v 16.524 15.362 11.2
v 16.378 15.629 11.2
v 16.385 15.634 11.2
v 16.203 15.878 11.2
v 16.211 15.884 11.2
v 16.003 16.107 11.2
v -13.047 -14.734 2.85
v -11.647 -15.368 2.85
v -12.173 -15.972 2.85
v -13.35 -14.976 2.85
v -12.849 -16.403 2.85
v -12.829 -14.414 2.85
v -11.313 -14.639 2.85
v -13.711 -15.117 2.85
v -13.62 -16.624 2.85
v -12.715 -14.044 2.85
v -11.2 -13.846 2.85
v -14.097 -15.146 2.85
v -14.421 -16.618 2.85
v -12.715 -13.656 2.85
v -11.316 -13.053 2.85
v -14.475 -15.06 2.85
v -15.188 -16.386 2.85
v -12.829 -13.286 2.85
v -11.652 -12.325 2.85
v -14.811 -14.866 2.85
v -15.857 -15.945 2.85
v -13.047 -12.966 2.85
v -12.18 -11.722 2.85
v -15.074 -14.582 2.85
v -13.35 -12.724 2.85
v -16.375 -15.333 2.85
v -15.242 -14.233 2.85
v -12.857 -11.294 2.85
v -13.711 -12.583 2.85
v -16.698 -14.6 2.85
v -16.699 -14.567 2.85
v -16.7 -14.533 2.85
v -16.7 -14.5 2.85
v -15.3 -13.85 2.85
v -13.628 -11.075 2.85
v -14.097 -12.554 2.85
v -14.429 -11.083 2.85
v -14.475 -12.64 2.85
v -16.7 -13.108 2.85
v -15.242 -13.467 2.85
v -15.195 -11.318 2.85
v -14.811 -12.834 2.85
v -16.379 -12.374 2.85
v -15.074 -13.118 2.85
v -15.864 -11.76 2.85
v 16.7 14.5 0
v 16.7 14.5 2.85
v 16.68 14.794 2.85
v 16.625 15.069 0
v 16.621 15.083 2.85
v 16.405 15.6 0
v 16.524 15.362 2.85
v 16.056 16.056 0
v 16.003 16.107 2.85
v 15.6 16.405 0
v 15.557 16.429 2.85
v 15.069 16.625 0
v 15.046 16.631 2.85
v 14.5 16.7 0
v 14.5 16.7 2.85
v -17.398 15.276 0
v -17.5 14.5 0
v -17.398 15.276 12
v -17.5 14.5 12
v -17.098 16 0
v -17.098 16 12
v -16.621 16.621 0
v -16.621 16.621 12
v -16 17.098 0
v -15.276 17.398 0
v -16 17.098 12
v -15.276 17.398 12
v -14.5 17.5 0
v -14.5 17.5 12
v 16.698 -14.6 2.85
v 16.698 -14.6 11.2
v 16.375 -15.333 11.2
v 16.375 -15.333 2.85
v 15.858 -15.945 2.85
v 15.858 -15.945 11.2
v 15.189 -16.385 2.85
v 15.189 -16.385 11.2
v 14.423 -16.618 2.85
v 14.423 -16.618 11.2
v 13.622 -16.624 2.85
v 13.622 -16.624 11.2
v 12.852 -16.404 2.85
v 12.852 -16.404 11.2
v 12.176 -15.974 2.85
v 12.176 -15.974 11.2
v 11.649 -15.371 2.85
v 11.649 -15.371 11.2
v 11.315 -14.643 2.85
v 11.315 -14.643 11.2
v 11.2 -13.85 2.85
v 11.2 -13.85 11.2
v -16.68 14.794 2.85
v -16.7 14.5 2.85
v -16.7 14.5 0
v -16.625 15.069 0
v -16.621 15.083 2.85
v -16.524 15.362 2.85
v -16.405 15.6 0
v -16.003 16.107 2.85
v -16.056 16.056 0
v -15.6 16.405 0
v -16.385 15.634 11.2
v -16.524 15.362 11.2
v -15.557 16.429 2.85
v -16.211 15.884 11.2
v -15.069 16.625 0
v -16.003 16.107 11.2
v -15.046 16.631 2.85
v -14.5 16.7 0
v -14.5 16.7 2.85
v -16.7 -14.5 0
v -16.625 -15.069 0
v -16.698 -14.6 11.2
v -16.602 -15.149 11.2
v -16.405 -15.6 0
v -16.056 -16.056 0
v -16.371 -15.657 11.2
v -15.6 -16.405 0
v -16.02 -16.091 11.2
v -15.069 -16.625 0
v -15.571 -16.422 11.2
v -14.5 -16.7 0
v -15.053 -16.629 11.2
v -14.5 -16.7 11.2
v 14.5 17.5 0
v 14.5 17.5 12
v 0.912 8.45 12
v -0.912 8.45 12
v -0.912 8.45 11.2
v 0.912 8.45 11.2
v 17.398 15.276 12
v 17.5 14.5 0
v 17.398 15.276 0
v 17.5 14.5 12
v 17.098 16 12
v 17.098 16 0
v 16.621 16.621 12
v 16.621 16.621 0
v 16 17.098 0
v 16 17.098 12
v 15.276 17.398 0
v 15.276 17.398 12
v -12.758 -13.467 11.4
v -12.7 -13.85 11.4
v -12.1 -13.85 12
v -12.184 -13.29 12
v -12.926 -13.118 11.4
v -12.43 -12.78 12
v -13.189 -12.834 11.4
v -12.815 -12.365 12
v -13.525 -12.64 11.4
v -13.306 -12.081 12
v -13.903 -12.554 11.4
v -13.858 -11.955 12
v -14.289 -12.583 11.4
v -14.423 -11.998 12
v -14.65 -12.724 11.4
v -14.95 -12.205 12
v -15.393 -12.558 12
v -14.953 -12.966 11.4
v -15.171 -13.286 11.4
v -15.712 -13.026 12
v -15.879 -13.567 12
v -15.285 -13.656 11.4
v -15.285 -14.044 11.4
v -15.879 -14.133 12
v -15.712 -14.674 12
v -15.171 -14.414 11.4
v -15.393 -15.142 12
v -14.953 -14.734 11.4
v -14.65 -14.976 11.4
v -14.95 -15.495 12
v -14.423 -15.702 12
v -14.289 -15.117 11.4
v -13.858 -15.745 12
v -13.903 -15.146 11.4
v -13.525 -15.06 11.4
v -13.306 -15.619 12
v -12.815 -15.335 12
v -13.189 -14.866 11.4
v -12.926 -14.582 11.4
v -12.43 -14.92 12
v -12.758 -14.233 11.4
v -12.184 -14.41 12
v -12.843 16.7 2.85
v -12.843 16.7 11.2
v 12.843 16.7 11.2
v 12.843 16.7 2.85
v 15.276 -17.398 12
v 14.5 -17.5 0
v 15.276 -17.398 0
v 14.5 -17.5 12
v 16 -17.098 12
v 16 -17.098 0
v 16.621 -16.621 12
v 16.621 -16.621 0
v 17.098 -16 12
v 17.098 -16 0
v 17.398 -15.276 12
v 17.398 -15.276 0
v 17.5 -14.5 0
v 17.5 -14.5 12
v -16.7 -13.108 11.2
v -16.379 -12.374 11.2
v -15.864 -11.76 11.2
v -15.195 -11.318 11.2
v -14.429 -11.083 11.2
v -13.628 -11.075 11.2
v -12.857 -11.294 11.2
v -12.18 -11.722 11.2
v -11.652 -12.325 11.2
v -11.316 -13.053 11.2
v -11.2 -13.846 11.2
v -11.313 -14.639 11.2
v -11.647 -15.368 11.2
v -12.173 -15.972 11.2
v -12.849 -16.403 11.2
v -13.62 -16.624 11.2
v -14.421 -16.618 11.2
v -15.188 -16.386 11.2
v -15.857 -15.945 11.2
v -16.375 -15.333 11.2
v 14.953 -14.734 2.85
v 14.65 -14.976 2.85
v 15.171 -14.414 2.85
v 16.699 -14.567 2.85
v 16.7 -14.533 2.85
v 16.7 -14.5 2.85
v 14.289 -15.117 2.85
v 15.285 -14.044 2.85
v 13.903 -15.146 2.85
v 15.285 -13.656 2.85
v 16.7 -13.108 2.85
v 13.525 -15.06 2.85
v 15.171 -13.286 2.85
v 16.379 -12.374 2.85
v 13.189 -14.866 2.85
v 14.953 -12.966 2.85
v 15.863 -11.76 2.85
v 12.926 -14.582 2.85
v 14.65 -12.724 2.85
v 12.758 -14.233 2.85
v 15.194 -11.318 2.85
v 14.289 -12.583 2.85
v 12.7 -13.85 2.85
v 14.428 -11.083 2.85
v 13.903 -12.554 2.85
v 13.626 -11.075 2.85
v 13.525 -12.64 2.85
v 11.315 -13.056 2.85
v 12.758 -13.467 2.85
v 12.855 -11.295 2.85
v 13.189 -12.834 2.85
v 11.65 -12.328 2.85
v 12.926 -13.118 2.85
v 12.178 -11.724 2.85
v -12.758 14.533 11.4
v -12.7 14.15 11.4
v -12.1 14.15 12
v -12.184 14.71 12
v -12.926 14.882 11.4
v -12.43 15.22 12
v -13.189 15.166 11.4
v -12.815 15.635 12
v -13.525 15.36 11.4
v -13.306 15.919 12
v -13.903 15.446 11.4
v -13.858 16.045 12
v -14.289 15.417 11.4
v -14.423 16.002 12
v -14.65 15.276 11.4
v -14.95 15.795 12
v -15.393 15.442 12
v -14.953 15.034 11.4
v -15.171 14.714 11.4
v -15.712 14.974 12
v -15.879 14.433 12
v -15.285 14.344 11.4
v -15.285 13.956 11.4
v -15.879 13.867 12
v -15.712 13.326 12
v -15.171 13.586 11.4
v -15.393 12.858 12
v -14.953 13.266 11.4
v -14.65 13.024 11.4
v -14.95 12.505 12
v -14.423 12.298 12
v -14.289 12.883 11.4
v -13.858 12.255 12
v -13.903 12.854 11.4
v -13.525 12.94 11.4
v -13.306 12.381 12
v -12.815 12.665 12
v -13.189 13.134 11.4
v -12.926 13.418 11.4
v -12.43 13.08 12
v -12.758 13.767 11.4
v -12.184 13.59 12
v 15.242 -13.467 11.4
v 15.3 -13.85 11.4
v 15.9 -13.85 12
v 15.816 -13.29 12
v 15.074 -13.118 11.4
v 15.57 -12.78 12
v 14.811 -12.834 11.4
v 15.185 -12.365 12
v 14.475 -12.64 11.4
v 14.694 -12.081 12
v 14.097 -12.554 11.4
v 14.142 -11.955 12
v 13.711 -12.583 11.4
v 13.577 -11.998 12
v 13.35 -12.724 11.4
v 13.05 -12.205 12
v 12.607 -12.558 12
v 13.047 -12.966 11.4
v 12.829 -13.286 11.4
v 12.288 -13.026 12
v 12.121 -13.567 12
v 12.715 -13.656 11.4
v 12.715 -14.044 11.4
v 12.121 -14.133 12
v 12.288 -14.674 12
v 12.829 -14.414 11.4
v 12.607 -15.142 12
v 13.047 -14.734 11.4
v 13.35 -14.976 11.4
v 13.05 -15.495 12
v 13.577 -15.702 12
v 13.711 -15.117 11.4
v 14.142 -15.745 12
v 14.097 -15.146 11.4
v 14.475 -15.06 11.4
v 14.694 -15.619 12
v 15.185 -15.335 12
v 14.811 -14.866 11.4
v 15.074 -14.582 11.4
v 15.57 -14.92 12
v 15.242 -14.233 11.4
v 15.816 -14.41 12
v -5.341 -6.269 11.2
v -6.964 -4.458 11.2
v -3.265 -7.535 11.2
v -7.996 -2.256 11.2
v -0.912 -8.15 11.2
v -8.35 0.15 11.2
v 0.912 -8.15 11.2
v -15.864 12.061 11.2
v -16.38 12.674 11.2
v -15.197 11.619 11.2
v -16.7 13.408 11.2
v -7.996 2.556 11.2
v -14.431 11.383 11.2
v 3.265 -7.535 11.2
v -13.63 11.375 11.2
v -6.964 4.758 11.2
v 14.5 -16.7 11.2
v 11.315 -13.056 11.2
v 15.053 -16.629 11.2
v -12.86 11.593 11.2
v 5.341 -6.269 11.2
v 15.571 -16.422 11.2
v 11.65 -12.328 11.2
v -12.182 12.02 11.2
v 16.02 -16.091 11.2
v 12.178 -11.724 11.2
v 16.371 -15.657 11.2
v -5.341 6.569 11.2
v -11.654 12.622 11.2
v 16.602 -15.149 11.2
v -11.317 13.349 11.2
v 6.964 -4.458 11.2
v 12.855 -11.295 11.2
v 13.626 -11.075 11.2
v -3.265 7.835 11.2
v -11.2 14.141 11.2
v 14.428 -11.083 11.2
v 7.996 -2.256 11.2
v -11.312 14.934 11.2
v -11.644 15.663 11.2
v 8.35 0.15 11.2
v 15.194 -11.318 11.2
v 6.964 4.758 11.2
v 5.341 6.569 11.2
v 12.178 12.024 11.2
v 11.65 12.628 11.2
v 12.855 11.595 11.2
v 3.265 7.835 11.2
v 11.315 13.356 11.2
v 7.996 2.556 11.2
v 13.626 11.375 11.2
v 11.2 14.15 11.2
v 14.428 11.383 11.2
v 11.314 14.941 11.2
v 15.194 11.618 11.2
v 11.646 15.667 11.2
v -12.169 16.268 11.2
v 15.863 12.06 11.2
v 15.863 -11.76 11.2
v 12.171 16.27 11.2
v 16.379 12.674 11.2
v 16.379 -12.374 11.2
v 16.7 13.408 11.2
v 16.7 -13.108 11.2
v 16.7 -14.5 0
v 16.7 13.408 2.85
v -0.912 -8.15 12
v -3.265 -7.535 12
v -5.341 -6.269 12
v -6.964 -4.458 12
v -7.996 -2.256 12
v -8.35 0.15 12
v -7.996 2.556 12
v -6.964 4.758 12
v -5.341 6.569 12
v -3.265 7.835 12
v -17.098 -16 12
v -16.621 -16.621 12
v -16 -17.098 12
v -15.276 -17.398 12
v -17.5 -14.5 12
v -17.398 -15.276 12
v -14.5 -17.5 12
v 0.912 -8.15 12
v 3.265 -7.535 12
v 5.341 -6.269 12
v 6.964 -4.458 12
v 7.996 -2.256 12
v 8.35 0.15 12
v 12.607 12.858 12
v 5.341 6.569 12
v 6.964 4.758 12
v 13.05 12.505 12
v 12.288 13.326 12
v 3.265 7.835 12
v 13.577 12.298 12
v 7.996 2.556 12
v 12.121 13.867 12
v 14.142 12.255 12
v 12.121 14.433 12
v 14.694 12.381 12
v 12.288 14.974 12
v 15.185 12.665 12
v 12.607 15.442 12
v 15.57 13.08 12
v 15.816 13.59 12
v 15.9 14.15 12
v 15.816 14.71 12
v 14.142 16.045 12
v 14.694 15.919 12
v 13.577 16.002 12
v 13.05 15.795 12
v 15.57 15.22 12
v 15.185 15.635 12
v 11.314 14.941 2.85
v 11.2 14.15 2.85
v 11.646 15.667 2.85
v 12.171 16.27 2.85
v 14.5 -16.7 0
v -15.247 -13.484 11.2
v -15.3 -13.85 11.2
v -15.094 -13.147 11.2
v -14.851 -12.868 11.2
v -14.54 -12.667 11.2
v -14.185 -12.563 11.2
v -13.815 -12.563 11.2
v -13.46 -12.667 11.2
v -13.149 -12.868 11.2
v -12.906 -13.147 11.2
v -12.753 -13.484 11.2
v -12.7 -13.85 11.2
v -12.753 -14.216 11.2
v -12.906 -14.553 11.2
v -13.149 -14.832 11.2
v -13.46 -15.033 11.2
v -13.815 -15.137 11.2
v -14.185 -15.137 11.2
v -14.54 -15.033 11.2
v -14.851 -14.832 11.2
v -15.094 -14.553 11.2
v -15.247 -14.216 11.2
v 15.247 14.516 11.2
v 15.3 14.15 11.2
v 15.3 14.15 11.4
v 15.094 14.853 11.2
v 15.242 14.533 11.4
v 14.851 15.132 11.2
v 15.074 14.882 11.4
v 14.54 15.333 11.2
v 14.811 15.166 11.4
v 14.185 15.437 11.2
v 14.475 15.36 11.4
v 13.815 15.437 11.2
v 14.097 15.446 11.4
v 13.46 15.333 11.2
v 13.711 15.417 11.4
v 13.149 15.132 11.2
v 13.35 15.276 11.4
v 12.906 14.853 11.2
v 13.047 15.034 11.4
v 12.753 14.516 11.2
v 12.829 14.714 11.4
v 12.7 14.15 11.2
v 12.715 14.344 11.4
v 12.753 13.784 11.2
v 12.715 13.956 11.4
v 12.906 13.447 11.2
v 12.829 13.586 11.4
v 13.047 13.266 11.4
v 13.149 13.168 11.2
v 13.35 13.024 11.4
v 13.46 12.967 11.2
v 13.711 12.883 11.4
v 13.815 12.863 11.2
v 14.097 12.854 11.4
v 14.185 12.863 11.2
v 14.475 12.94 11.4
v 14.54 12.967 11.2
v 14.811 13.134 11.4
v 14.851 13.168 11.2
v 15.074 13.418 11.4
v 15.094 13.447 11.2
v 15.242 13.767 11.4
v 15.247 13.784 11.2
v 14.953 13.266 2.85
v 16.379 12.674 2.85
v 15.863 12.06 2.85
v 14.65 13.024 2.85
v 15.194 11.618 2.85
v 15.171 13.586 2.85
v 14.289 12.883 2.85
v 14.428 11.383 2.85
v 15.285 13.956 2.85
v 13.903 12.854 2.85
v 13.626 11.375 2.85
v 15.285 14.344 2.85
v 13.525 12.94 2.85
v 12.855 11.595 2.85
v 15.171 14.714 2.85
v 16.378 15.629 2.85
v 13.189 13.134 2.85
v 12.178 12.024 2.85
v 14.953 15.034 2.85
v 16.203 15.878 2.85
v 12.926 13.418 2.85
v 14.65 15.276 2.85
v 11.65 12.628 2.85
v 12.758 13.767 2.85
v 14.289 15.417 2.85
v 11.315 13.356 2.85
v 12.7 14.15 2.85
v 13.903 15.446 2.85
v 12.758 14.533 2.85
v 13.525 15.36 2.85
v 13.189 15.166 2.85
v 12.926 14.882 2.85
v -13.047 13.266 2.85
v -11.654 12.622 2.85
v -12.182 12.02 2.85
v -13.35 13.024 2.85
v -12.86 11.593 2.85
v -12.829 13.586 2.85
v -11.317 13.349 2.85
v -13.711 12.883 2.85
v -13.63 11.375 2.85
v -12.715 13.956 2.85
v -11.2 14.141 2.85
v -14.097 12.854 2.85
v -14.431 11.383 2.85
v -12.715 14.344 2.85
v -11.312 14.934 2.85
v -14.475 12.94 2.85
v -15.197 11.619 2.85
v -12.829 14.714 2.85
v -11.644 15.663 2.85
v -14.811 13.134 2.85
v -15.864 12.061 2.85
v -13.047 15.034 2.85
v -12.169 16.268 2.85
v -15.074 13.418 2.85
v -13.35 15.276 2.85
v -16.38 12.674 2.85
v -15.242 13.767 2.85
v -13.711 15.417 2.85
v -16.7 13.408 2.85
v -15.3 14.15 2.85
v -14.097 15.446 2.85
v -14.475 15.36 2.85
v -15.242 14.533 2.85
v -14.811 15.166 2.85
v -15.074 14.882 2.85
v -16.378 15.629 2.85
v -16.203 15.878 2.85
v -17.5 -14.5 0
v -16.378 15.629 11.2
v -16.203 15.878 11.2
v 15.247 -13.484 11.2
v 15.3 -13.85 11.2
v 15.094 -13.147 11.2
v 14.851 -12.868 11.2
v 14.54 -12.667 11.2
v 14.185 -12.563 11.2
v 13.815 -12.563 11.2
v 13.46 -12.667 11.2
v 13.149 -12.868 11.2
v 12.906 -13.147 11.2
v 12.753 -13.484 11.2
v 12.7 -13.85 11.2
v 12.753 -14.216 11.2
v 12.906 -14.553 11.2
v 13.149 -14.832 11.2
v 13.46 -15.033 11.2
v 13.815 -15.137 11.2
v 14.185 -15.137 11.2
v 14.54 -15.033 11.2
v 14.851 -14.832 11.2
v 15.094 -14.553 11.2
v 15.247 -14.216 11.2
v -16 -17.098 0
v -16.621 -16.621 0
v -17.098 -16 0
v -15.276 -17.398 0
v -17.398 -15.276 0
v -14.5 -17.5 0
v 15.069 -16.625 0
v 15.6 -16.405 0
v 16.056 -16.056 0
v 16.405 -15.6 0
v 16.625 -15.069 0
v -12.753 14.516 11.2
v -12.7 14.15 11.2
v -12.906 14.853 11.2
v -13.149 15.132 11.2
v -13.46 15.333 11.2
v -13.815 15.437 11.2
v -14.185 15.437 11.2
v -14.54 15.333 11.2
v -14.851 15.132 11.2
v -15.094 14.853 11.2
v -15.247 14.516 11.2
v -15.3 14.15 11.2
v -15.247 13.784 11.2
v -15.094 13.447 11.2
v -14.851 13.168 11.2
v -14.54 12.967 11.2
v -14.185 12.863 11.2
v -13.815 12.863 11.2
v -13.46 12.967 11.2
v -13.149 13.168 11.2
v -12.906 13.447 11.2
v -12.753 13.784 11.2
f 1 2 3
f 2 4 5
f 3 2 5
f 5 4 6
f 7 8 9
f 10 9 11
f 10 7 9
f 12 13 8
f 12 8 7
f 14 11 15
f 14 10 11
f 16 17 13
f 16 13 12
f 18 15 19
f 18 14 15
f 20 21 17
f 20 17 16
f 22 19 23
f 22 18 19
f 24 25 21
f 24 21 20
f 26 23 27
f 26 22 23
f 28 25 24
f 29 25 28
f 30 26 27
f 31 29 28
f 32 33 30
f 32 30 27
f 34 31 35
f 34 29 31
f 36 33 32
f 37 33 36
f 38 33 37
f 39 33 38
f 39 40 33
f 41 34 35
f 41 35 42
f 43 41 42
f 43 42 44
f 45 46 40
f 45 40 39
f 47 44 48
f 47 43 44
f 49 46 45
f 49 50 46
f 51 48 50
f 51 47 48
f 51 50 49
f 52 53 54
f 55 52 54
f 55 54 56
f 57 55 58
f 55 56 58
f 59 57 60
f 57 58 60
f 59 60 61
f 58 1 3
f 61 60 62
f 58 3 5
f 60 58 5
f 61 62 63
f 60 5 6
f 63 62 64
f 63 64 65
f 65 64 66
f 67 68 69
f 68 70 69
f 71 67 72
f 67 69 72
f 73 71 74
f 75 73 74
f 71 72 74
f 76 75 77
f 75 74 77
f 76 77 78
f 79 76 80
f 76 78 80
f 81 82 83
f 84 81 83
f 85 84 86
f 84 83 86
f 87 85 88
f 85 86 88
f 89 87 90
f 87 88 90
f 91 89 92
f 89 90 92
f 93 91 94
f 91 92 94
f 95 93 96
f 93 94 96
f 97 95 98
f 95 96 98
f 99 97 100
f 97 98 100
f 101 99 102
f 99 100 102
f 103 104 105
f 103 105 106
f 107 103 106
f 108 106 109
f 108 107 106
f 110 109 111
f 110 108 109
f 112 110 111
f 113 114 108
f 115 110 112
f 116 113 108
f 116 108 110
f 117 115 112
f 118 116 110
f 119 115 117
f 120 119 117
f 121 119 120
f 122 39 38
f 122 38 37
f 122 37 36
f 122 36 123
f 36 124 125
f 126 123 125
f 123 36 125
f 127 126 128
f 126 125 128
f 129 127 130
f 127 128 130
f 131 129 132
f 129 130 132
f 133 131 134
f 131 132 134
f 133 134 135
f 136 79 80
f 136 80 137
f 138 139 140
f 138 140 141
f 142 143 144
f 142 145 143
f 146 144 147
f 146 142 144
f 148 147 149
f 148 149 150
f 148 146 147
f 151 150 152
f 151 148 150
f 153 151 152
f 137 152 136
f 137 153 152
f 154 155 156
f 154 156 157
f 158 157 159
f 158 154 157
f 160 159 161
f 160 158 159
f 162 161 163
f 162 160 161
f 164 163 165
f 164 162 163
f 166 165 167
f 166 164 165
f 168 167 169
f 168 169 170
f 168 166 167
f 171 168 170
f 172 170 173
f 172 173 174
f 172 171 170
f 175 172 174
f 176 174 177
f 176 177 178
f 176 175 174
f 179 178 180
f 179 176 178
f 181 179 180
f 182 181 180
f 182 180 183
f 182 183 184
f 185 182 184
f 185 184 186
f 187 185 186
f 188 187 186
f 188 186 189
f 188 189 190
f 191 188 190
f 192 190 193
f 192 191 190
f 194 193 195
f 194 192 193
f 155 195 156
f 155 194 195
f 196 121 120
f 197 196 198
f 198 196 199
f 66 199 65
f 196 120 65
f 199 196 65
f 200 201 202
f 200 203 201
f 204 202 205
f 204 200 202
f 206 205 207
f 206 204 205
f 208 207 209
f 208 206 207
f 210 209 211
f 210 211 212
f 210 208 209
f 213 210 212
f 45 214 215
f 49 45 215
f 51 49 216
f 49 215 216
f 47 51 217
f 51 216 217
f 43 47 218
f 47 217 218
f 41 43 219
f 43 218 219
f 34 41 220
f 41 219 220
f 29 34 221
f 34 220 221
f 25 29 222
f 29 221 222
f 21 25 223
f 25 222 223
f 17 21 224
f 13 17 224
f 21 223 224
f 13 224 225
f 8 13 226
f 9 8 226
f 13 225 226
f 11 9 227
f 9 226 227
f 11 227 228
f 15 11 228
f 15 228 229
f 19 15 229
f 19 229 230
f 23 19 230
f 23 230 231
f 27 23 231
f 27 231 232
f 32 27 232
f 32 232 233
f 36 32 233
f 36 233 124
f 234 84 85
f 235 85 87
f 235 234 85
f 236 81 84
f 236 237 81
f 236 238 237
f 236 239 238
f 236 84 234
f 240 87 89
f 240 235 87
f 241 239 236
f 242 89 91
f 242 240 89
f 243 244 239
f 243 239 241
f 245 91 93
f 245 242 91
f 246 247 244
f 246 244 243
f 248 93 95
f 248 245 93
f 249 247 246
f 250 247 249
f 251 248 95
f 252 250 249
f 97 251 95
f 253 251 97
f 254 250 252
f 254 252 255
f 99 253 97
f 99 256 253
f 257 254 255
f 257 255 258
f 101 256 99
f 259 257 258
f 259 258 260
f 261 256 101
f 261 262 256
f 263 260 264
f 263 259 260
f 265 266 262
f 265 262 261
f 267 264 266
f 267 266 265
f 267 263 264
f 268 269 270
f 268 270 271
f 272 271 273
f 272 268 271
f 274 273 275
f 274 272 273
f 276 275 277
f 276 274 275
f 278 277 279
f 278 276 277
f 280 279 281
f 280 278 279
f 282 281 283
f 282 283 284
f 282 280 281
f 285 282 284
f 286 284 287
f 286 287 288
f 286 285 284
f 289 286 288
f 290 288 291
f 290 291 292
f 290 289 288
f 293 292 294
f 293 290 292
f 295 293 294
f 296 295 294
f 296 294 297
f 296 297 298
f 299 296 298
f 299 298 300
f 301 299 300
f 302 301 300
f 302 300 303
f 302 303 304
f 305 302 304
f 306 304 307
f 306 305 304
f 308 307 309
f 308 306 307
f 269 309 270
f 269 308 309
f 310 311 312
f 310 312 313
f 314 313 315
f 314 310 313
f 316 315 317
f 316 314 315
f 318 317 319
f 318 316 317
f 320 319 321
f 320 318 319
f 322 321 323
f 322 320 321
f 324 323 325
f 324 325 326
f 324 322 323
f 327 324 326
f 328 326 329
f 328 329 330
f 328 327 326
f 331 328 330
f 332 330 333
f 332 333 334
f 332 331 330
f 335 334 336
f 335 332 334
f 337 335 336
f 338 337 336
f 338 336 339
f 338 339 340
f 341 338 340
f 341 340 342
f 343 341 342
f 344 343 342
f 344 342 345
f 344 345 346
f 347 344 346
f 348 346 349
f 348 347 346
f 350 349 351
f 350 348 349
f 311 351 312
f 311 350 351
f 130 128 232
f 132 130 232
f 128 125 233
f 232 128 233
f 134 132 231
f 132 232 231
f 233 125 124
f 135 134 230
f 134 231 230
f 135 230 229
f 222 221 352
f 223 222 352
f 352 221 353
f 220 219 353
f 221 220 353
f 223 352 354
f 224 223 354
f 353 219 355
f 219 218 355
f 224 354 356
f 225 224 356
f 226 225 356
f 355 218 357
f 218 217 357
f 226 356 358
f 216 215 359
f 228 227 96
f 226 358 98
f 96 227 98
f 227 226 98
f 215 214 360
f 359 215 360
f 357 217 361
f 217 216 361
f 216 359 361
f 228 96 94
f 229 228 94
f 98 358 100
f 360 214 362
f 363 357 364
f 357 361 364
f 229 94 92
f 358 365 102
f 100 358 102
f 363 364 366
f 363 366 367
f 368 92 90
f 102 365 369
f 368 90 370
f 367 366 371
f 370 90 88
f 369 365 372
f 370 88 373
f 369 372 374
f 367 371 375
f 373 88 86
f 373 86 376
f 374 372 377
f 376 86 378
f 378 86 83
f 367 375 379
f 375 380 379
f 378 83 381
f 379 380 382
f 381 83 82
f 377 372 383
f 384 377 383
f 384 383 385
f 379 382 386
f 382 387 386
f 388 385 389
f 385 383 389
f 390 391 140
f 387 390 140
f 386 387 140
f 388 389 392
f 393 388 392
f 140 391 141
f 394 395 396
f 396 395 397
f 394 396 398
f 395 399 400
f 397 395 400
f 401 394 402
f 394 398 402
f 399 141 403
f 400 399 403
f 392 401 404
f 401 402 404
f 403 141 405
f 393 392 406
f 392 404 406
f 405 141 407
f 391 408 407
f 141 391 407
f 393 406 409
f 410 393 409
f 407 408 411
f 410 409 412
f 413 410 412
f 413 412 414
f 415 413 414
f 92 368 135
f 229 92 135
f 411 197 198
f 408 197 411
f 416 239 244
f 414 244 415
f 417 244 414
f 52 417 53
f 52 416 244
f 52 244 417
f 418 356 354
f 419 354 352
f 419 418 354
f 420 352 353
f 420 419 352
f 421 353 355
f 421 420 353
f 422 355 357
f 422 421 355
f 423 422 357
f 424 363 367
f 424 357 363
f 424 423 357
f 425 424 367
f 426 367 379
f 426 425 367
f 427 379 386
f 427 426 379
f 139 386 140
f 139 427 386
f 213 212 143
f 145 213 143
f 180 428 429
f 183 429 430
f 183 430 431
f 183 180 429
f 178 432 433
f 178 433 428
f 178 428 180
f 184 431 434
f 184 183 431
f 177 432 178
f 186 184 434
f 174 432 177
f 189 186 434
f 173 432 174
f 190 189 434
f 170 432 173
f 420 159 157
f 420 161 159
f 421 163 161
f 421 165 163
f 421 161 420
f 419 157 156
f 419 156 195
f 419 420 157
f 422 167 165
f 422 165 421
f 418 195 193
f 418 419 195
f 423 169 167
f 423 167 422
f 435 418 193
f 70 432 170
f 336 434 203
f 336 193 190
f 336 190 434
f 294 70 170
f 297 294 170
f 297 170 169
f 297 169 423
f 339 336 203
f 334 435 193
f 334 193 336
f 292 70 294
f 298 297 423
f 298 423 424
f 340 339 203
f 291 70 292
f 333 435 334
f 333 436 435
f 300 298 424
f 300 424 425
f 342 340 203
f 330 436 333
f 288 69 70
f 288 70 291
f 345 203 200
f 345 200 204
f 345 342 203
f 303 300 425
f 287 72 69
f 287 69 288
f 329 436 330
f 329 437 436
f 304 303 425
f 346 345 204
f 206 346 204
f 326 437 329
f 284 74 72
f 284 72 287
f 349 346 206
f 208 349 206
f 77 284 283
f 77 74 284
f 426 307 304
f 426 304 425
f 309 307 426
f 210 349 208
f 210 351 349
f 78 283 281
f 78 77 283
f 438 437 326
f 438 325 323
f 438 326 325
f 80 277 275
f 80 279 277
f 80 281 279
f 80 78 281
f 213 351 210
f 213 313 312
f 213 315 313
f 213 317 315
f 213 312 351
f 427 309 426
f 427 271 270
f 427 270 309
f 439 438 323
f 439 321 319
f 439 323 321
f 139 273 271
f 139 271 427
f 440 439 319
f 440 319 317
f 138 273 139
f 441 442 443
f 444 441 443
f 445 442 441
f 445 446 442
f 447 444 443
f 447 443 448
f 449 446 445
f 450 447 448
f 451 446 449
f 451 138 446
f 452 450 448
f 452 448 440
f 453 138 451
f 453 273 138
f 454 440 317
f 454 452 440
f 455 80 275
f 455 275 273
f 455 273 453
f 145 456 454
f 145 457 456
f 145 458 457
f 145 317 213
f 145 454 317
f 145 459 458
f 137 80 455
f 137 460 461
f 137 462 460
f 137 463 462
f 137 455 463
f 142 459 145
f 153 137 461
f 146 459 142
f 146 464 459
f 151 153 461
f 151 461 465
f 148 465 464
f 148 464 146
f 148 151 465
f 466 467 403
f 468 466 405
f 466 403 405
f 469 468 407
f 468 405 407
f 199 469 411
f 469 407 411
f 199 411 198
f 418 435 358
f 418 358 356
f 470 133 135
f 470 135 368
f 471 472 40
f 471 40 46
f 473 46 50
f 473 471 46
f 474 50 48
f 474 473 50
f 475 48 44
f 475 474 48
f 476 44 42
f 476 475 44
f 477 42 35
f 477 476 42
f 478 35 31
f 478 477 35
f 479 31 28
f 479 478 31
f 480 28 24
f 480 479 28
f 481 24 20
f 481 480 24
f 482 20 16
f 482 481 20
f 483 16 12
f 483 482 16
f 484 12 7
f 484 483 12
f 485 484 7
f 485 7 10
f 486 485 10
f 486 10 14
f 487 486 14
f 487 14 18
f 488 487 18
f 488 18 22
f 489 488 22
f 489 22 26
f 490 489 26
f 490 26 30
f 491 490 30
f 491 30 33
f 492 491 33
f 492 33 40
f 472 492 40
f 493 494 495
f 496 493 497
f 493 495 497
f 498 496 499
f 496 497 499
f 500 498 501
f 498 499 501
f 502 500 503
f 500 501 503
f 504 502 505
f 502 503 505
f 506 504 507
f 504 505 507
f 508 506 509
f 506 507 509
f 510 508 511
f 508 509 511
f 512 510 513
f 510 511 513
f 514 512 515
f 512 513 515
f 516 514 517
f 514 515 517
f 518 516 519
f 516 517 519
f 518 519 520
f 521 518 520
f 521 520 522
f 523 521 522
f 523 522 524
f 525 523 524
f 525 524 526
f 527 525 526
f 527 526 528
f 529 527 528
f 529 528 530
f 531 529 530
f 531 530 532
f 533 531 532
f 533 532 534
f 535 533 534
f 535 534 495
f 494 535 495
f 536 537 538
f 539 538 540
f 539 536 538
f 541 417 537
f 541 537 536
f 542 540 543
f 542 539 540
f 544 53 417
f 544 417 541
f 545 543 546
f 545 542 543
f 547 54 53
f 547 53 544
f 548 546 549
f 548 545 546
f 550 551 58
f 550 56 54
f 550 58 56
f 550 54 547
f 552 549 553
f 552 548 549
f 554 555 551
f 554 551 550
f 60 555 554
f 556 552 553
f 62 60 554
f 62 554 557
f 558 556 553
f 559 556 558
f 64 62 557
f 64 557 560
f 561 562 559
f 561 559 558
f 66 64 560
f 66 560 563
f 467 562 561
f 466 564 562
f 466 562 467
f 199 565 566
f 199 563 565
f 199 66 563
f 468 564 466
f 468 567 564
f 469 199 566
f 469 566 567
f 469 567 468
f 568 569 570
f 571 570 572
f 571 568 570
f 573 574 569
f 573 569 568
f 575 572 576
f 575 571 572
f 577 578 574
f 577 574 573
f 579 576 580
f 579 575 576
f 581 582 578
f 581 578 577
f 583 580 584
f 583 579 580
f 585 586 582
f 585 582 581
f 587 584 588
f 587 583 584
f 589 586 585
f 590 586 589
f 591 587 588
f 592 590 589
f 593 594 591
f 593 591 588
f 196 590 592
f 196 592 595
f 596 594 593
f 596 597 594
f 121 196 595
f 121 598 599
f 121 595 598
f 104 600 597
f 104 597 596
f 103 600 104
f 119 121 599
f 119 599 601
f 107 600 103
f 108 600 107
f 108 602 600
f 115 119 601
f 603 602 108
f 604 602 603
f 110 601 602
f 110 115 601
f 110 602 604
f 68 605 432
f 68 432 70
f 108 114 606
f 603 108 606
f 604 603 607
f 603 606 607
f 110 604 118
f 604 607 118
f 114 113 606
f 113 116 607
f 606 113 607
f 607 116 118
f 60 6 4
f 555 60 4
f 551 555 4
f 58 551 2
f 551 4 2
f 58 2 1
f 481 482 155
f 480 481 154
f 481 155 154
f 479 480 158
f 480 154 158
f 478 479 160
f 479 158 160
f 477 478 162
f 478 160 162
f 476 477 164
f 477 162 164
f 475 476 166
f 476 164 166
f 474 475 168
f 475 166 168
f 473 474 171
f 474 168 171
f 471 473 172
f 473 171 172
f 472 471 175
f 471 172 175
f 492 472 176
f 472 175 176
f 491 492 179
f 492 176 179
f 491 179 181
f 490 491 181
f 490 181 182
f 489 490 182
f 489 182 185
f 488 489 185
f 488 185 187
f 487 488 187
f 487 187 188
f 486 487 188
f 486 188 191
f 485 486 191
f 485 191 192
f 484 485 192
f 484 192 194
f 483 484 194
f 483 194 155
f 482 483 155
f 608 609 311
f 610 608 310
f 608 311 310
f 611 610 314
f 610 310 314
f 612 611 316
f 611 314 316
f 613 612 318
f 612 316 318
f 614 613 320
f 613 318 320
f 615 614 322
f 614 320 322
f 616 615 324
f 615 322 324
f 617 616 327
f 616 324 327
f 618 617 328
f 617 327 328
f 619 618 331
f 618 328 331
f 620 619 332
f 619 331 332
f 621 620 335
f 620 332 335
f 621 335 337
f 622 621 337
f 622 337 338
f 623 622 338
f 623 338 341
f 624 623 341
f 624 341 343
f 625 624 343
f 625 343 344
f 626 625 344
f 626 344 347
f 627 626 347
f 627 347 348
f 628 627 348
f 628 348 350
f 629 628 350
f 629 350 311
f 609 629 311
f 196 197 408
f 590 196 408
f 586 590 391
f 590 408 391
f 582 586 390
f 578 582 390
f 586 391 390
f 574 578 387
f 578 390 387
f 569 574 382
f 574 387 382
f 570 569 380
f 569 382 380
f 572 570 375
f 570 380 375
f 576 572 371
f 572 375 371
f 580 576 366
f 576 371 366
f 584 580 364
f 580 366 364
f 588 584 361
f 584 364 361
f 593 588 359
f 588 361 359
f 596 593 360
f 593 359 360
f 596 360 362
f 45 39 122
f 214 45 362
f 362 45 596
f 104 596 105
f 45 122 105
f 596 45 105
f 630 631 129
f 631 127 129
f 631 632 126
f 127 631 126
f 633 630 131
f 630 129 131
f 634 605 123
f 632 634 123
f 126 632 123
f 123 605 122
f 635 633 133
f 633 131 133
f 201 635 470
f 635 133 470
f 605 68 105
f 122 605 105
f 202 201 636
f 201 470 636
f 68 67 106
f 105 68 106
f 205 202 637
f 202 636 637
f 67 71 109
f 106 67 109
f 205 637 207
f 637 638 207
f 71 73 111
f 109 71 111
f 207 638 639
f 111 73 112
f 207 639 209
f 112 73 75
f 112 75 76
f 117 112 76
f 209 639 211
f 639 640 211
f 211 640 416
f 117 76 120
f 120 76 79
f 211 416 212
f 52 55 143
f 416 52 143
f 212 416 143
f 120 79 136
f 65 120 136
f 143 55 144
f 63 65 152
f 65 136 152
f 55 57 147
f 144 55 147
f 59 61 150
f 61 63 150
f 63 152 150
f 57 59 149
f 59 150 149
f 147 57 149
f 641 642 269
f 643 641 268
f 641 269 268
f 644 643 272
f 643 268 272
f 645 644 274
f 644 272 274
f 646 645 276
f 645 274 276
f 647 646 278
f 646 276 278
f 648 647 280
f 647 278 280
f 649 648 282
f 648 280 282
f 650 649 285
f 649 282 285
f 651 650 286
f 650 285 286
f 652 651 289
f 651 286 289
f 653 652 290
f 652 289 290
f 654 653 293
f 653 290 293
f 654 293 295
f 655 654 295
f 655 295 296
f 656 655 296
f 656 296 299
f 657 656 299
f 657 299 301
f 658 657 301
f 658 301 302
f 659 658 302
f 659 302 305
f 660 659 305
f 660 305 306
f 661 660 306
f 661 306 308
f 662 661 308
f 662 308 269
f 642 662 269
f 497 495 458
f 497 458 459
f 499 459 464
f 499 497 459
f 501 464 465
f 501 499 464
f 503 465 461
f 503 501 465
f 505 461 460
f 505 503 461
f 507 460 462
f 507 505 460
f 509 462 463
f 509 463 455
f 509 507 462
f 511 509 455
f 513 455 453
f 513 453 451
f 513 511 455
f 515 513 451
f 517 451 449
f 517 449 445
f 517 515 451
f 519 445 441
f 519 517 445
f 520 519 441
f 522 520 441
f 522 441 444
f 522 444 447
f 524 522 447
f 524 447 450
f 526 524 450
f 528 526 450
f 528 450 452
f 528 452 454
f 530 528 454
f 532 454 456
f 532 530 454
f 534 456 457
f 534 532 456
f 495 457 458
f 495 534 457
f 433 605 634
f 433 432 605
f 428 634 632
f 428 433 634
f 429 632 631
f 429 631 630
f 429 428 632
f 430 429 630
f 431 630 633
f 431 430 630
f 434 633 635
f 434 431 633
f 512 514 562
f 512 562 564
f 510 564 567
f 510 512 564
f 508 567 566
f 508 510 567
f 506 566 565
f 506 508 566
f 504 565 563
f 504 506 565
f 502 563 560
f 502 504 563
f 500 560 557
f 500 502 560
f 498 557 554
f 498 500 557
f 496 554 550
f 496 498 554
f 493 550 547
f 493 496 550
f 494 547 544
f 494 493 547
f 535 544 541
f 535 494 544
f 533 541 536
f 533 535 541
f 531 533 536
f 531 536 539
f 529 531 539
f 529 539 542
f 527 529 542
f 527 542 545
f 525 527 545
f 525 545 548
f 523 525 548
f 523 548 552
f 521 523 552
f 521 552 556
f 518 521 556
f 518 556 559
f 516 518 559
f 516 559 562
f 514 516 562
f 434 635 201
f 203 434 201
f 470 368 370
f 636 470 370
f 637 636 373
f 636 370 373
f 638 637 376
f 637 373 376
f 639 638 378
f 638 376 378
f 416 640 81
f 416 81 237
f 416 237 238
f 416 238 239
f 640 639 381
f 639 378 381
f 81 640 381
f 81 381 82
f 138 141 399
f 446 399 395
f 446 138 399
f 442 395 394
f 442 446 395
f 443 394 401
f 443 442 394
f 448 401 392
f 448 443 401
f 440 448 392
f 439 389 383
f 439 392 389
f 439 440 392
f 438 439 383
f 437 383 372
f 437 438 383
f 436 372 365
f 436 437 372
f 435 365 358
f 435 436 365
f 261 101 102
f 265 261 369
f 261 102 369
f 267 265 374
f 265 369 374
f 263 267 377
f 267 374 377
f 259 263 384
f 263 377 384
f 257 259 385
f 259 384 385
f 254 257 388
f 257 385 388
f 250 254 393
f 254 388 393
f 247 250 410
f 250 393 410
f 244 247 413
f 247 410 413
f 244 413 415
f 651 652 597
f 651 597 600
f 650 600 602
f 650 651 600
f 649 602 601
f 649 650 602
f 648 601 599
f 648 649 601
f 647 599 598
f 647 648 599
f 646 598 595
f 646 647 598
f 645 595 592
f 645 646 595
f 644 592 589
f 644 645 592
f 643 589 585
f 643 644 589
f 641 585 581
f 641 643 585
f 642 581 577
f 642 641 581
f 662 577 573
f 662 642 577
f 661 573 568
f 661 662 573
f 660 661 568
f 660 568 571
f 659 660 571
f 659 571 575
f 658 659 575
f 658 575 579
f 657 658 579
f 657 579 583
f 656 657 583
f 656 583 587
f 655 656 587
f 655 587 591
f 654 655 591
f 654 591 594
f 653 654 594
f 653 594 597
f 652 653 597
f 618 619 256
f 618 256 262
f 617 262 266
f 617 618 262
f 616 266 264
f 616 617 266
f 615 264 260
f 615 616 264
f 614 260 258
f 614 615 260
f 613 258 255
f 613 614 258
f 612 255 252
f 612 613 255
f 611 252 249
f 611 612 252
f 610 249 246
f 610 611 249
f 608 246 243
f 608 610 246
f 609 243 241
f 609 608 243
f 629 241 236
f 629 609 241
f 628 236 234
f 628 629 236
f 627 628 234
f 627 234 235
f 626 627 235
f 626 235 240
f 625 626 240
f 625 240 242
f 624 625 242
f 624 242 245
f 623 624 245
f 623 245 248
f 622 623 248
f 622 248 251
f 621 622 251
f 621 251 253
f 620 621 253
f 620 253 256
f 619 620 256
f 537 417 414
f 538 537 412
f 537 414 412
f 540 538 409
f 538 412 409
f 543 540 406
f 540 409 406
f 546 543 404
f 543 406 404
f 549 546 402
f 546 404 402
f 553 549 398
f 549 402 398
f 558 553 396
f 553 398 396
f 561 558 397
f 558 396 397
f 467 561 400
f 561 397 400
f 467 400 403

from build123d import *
from build123d.topology import SkipClean

# Parameters (mm, degrees)
CROQUIS2_W              = 35
CROQUIS2_H              = 35
SALIENTE_EXTRUIR1_DEPTH = 12
REDONDEO1_R             = 3
VACIADO1_T              = -0.8
CORTAR_EXTRUIR3_DEPTH   = 28.504545079
CROQUIS6_R              = 1.3
CORTAR_EXTRUIR4_DEPTH   = 28.504545079
CHAFL_N3_SIZE           = 0.6
CROQUIS7_R              = 2.8
CROQUIS7_R_2            = 1.3
SALIENTE_EXTRUIR2_DEPTH = 8.35


with BuildPart() as part:
    # Croquis2 → Saliente-Extruir1 (new body)
    with BuildSketch(Plane.XY):
        Rectangle(CROQUIS2_W, CROQUIS2_H)
    extrude(amount=SALIENTE_EXTRUIR1_DEPTH)

    # Redondeo1
    redondeo1_edges = [part.edges().sort_by_distance(p)[0] for p in [
        (17.5, -17.5, 6),
        (-17.5, -17.5, 6),
        (-17.5, 17.5, 6),
        (17.5, 17.5, 6),
    ]]
    fillet(redondeo1_edges, radius=REDONDEO1_R)

    # Vaciado1
    vaciado1_openings = [part.faces().sort_by_distance(p)[0] for p in [
        (0, 0, 0),
    ]]
    offset(amount=VACIADO1_T, openings=vaciado1_openings, kind=Kind.INTERSECTION)

    # Croquis5 → Cortar-Extruir3 (cut, through all)
    with BuildSketch(Plane.XY.offset(12)):
        with BuildLine():
            Line((-0.91241438, 8.45), (0.91241438, 8.45))
            ThreePointArc((0.91241438, 8.45), (8.35, 0.15), (0.91241438, -8.15))
            Line((0.91241438, -8.15), (-0.91241438, -8.15))
            ThreePointArc((-0.91241438, -8.15), (-8.35, 0.15), (-0.91241438, 8.45))
        make_face()
    extrude(amount=-CORTAR_EXTRUIR3_DEPTH, mode=Mode.SUBTRACT)

    # Croquis6 → Cortar-Extruir4 (cut, through all)
    with BuildSketch(Plane.XY.offset(12)):
        with Locations((-14, 14.15)):
            Circle(CROQUIS6_R)
        with Locations((14, 14.15)):
            Circle(CROQUIS6_R)
        with Locations((14, -13.85)):
            Circle(CROQUIS6_R)
        with Locations((-14, -13.85)):
            Circle(CROQUIS6_R)
    extrude(amount=-CORTAR_EXTRUIR4_DEPTH, mode=Mode.SUBTRACT)

    # Chaflán3
    chafl_n3_edges = [part.edges().sort_by_distance(p)[0] for p in [
        (-15.3, -13.85, 12),
        (12.7, -13.85, 12),
        (12.7, 14.15, 12),
        (-15.3, 14.15, 12),
    ]]
    chamfer(chafl_n3_edges, length=CHAFL_N3_SIZE)

    # Croquis7 → Saliente-Extruir2 (add)
    # profile 1 of 4: a face of its own
    with SkipClean():  # the faces are left unmerged after this step: merging them gives an invalid solid
        with BuildSketch(Plane(origin=(0, 0, 11.2), x_dir=(-1, 0, 0), z_dir=(0, 0, -1))):
            with Locations((-14, 14.15)):
                Circle(CROQUIS7_R)
            with Locations((-14, 14.15)):
                Circle(CROQUIS7_R_2, mode=Mode.SUBTRACT)
        # profile 2 of 4: a face of its own
        with BuildSketch(Plane(origin=(0, 0, 11.2), x_dir=(-1, 0, 0), z_dir=(0, 0, -1))):
            with Locations((14, 14.15)):
                Circle(CROQUIS7_R)
            with Locations((14, 14.15)):
                Circle(CROQUIS7_R_2, mode=Mode.SUBTRACT)
        # profile 3 of 4: a face of its own
        with BuildSketch(Plane(origin=(0, 0, 11.2), x_dir=(-1, 0, 0), z_dir=(0, 0, -1))):
            with Locations((14, -13.85)):
                Circle(CROQUIS7_R)
            with Locations((14, -13.85)):
                Circle(CROQUIS7_R_2, mode=Mode.SUBTRACT)
        # profile 4 of 4: a face of its own
        with BuildSketch(Plane(origin=(0, 0, 11.2), x_dir=(-1, 0, 0), z_dir=(0, 0, -1))):
            with Locations((-14, -13.85)):
                Circle(CROQUIS7_R)
            with Locations((-14, -13.85)):
                Circle(CROQUIS7_R_2, mode=Mode.SUBTRACT)
        extrude(amount=SALIENTE_EXTRUIR2_DEPTH)


solid = part.part
